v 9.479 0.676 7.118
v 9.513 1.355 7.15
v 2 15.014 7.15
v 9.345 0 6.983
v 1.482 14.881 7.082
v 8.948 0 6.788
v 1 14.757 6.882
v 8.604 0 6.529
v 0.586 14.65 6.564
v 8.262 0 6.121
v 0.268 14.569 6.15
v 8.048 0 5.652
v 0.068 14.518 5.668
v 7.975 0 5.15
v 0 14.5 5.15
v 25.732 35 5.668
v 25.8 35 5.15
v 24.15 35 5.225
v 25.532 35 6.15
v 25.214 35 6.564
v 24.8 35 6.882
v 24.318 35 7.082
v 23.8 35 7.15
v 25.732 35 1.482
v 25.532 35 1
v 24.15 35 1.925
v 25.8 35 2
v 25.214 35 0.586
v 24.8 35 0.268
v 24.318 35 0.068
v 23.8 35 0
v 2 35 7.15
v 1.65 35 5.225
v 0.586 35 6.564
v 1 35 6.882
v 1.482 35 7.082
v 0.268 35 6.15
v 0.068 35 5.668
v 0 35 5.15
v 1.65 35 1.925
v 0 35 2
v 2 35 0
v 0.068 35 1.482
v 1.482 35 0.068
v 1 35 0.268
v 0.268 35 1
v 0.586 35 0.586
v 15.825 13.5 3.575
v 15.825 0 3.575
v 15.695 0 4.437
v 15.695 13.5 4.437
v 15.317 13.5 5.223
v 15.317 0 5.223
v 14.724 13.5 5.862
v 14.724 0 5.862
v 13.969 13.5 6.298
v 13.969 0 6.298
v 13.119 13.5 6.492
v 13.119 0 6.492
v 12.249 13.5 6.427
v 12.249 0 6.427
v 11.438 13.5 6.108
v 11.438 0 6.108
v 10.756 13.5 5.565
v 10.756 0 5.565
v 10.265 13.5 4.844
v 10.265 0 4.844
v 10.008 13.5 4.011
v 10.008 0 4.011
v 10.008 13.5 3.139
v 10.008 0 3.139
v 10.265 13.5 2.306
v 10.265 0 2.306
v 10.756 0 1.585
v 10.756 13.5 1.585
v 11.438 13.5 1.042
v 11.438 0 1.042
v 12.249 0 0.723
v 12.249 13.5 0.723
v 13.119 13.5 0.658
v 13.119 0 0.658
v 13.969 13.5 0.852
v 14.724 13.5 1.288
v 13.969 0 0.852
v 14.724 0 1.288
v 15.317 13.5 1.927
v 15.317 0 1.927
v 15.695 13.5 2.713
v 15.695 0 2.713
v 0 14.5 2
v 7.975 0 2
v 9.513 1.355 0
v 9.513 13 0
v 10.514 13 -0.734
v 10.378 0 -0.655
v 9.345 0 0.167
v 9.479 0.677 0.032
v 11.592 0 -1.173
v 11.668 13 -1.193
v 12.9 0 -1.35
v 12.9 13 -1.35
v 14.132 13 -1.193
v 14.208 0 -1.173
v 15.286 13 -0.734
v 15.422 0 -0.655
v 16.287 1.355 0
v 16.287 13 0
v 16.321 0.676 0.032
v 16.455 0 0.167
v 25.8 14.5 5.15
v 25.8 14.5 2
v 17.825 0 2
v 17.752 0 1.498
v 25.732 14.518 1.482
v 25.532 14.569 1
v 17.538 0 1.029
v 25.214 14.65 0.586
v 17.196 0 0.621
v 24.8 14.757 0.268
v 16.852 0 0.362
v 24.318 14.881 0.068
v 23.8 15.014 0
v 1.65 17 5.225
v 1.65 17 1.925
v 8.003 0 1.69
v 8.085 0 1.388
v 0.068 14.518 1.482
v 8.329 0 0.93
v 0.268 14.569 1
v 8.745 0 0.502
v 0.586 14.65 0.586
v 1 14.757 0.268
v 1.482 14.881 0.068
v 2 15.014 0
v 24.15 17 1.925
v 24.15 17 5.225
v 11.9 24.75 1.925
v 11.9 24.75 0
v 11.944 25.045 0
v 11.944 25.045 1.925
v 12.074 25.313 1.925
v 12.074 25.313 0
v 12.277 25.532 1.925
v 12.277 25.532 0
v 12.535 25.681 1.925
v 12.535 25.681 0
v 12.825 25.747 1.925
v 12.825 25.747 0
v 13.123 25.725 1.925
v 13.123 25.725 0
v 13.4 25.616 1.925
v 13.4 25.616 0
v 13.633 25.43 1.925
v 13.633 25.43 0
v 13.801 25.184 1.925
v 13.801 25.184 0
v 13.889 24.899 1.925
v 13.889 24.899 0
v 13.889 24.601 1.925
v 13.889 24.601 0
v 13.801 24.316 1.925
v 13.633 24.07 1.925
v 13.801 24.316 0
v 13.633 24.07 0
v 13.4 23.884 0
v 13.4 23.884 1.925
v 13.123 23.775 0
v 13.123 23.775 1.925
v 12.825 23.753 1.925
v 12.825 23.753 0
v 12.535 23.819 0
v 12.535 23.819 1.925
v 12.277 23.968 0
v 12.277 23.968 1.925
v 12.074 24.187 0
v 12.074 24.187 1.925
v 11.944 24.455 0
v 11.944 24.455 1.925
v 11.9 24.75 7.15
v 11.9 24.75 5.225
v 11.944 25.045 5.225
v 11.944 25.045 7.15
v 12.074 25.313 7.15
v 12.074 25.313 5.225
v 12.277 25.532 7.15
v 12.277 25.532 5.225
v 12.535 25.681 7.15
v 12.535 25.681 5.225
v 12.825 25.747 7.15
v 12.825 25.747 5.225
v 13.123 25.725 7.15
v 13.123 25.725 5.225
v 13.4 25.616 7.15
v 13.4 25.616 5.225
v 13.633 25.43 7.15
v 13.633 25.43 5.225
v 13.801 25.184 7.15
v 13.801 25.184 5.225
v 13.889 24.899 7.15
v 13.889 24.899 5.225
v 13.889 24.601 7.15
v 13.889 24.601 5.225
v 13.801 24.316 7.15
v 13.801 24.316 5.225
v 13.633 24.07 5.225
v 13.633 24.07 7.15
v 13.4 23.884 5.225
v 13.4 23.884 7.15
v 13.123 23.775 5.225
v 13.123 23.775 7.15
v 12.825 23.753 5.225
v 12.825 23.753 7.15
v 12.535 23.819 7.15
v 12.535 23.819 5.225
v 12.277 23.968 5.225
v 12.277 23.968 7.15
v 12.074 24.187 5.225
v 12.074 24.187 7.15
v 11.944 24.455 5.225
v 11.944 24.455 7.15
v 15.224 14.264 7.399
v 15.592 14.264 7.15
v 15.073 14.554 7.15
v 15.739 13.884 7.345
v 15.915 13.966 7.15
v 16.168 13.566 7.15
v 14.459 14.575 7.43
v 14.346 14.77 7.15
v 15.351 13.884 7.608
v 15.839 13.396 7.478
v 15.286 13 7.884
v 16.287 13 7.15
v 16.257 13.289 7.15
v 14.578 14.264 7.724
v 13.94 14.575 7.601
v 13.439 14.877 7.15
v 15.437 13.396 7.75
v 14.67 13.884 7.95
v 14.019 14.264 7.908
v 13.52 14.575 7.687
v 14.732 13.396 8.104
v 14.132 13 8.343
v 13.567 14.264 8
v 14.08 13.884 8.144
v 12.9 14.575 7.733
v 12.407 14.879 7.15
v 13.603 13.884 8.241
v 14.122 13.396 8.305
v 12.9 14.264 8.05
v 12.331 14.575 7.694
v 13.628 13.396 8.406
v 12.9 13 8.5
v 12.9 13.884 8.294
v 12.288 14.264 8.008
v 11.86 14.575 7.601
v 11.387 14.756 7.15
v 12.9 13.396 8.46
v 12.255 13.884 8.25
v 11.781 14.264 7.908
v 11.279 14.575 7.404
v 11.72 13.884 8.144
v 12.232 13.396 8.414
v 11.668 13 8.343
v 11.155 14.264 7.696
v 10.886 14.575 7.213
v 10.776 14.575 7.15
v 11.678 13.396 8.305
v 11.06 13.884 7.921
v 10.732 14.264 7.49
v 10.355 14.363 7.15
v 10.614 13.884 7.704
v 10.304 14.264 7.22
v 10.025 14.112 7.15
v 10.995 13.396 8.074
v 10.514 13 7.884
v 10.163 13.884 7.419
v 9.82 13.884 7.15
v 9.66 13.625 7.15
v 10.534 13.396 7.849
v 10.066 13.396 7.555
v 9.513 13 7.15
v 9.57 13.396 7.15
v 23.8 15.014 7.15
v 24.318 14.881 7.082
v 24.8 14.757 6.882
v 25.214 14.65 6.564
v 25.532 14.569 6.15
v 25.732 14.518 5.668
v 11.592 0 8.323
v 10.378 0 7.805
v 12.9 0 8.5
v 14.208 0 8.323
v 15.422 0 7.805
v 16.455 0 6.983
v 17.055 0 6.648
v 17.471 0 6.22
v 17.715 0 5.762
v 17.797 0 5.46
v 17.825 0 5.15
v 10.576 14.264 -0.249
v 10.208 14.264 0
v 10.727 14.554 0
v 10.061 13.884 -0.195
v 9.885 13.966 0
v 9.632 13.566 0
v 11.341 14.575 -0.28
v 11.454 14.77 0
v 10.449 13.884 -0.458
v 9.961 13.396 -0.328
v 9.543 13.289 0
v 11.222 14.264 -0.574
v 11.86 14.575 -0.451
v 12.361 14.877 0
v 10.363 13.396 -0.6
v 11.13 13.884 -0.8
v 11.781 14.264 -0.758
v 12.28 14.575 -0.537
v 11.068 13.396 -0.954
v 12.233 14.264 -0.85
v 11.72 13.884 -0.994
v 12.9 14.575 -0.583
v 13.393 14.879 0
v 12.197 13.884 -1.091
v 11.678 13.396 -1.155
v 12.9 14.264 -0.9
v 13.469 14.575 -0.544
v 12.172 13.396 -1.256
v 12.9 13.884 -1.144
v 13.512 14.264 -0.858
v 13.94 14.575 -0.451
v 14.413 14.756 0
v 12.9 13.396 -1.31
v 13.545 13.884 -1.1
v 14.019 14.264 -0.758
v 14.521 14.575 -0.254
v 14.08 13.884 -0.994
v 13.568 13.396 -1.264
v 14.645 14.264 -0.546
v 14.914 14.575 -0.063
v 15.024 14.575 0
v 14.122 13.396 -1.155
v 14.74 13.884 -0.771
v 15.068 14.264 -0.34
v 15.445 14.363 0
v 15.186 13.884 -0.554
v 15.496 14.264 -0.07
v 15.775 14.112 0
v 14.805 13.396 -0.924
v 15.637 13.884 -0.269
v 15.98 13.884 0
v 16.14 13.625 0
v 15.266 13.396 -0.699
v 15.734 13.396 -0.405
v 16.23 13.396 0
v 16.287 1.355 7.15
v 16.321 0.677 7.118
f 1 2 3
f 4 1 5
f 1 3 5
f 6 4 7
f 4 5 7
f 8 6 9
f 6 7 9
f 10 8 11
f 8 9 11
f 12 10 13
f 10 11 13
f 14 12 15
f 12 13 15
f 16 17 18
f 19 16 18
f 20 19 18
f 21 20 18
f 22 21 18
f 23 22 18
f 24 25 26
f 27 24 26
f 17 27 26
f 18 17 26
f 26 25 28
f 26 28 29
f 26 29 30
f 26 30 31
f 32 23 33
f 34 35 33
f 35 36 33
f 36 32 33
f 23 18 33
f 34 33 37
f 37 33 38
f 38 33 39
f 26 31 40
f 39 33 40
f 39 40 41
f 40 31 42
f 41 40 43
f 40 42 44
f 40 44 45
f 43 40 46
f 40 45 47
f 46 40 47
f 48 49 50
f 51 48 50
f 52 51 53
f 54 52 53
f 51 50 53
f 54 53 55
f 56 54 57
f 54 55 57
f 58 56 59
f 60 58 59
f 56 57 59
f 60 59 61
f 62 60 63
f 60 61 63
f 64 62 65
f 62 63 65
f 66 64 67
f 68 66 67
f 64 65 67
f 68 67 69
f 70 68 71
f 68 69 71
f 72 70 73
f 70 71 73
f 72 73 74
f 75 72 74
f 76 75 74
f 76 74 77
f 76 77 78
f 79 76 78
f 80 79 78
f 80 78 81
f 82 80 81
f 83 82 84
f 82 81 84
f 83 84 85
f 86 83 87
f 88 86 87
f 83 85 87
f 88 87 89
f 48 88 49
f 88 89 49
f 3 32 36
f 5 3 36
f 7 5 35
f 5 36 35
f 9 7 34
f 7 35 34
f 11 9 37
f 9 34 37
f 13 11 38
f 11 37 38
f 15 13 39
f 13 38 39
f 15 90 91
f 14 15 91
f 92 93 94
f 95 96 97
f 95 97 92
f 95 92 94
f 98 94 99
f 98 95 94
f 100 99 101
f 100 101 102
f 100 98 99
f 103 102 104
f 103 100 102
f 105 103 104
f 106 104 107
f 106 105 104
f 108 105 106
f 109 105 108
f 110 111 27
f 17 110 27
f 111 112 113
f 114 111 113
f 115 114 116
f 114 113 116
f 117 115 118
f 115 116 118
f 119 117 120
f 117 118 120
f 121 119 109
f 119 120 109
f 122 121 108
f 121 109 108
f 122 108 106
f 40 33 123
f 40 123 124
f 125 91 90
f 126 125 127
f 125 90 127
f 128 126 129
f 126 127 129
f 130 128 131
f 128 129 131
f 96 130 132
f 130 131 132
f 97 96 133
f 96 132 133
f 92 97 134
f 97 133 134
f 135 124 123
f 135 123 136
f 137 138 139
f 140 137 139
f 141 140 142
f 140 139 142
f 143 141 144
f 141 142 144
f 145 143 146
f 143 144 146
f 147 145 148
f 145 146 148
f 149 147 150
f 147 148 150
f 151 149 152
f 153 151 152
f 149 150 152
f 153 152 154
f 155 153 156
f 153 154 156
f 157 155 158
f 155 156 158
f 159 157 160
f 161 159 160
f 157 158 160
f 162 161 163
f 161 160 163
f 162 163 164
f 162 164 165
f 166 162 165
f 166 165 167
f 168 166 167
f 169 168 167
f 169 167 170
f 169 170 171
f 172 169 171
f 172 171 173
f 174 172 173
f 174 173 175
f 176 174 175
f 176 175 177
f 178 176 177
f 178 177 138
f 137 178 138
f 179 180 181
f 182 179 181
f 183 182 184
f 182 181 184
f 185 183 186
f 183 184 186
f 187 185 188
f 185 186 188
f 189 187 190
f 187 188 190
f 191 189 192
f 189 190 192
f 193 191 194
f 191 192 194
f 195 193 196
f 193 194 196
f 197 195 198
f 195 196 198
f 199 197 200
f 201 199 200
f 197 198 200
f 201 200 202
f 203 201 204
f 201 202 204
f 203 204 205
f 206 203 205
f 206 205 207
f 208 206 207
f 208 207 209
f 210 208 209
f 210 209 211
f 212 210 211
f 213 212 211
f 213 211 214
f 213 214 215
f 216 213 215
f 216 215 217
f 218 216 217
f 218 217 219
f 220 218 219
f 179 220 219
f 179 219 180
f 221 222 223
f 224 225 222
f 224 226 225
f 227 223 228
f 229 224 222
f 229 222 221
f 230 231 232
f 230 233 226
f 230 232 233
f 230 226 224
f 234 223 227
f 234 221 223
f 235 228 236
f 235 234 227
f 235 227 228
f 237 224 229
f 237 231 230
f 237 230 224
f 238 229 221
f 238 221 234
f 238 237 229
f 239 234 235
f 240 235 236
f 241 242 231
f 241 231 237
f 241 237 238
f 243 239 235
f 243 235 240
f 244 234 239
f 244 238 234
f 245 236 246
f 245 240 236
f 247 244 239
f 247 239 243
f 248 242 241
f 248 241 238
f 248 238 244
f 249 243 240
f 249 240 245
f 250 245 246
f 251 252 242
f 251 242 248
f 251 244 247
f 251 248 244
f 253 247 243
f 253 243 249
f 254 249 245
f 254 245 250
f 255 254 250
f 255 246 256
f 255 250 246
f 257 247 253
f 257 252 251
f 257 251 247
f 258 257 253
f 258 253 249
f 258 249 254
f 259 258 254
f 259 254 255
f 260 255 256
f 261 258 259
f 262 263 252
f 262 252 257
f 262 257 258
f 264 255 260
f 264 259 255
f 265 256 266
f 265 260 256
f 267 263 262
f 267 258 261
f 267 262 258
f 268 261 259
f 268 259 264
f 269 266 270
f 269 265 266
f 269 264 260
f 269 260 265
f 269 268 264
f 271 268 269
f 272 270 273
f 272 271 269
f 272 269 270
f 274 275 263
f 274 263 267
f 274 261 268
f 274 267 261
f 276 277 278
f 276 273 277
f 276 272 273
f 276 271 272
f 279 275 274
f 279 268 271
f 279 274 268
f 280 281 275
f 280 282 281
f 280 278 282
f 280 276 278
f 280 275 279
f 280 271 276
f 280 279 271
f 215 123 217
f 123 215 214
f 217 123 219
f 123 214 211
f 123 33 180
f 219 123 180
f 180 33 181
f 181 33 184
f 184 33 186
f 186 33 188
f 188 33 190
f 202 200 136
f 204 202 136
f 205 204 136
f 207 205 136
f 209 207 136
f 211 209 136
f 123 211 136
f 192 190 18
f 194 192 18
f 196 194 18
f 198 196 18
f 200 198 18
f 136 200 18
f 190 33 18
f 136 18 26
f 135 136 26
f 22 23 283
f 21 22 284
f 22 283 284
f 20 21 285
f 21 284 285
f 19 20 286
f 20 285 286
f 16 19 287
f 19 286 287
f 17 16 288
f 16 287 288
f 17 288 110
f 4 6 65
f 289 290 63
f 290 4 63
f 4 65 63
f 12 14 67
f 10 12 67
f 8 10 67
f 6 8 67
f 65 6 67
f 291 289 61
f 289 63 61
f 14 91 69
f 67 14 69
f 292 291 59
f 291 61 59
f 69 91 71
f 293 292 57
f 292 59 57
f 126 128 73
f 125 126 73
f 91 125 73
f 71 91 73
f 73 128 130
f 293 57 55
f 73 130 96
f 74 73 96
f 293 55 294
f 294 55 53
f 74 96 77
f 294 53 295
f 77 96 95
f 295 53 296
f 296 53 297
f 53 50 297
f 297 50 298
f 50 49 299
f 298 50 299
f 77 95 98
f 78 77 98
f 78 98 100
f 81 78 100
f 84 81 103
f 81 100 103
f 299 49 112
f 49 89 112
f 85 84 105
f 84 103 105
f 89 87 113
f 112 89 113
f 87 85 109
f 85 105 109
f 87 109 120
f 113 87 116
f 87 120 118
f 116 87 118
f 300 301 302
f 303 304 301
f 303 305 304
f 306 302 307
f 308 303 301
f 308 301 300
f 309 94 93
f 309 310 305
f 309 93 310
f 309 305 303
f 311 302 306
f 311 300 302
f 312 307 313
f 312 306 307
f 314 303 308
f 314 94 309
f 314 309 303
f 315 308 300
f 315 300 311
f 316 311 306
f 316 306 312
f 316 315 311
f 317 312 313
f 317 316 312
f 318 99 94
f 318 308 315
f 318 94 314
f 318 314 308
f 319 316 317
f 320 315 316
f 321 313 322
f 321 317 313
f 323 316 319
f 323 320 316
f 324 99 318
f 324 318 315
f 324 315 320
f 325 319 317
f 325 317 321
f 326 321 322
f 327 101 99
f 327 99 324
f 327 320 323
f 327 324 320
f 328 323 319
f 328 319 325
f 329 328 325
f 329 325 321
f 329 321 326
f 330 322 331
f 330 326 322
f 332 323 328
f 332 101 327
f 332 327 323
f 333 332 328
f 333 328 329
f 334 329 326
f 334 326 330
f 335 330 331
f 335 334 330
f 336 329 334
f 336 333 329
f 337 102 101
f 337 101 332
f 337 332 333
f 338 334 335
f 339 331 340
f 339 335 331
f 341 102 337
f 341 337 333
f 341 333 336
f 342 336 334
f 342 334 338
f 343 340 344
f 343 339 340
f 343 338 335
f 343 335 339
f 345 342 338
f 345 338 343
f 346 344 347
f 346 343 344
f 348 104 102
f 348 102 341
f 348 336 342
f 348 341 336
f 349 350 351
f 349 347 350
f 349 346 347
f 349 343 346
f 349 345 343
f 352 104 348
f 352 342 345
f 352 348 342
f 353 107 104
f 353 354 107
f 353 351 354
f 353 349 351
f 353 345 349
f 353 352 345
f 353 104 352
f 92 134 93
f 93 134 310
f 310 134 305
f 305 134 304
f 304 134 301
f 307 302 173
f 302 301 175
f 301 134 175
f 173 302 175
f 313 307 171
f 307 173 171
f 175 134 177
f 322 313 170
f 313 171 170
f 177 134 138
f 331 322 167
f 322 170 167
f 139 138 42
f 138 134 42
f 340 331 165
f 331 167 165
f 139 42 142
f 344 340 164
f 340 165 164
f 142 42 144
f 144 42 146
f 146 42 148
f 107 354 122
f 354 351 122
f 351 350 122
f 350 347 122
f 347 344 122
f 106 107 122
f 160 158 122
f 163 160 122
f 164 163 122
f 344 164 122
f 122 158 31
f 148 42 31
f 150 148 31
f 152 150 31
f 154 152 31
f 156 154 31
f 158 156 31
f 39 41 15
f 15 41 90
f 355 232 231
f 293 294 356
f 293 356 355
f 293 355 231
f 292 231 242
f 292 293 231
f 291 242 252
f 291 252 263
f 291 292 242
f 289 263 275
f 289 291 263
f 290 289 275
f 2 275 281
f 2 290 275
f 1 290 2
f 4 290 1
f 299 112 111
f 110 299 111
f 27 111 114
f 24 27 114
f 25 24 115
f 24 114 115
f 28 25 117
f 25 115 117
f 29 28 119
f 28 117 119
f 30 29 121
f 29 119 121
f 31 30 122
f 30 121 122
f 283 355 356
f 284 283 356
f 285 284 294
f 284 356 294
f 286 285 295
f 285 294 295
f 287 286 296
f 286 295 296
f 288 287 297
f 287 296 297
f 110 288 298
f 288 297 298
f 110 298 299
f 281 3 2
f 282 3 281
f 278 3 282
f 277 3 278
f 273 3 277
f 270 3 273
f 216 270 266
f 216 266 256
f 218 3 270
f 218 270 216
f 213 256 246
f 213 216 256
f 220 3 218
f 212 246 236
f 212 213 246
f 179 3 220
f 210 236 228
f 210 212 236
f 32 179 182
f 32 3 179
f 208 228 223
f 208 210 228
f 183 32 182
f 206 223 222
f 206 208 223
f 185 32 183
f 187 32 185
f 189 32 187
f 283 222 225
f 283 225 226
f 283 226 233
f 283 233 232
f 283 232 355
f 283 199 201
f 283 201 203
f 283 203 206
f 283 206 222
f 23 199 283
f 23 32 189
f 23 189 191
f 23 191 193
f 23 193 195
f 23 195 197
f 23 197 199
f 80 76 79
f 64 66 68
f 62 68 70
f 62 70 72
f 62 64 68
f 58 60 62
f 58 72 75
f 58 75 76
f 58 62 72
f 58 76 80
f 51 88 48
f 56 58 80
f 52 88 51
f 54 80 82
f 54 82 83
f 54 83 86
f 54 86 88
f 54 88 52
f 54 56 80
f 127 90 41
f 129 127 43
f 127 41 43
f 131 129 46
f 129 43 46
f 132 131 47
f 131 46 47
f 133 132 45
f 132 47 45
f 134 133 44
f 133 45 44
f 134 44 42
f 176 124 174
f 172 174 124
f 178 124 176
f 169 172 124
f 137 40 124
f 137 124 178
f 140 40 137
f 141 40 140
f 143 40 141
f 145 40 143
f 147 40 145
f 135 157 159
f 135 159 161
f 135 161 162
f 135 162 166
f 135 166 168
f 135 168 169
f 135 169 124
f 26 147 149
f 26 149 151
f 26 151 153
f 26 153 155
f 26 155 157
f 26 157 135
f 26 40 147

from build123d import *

# Parameters (mm, degrees)
BOSS_EXTRUDE1_DEPTH = 7.15
SKETCH3_R           = 4.925
BOSS_EXTRUDE2_DEPTH = 15
SKETCH4_R           = 2.925
CUT_EXTRUDE1_DEPTH  = 13.5
SKETCH5_W           = 22.5
SKETCH5_H           = 3.3
CUT_EXTRUDE2_DEPTH  = 18
SKETCH6_R           = 1
CUT_EXTRUDE3_DEPTH  = 45.304514443
FILLET1_R           = 2


with BuildPart() as part:
    # Sketch2 → Boss-Extrude1 (new body)
    with BuildSketch(Plane.XY):
        Polygon((7.975, 0), (17.825, 0), (25.8, 14.5), (25.8, 35), (0, 35), (0, 14.5), align=None)
    extrude(amount=BOSS_EXTRUDE1_DEPTH)

    # Sketch3 → Boss-Extrude2 (add)
    with BuildSketch(Plane.XZ):
        with Locations((12.9, 3.575)):
            Circle(SKETCH3_R)
    extrude(amount=-BOSS_EXTRUDE2_DEPTH)

    # Sketch4 → Cut-Extrude1 (cut)
    with BuildSketch(Plane.XZ):
        with Locations((12.9, 3.575)):
            Circle(SKETCH4_R)
    extrude(amount=-CUT_EXTRUDE1_DEPTH, mode=Mode.SUBTRACT)

    # Sketch5 → Cut-Extrude2 (cut)
    with BuildSketch(Plane(origin=(0, 35, 0), x_dir=(1, 0, 0), z_dir=(0, 1, 0))):
        with Locations((12.9, -3.575)):
            Rectangle(SKETCH5_W, SKETCH5_H)
    extrude(amount=-CUT_EXTRUDE2_DEPTH, mode=Mode.SUBTRACT)

    # Sketch6 → Cut-Extrude3 (cut, through all)
    with BuildSketch(Plane(origin=(0, 0, 0), x_dir=(-1, 0, 0), z_dir=(0, 0, -1))):
        with Locations((-12.9, 24.75)):
            Circle(SKETCH6_R)
    extrude(amount=-CUT_EXTRUDE3_DEPTH, mode=Mode.SUBTRACT)

    # Fillet1
    # the kernel refuses this fillet: 2 mm, written as the material it takes off along each edge
    with BuildSketch(Plane(origin=(12.9, 15, 3.575), x_dir=(0.9794089200895291, 0, -0.20188652072157354), z_dir=(-0.20188652072157354, 0, -0.9794089200895291))) as fillet1_piece_1_section:
        with BuildLine():
            CenterArc((4.925 - FILLET1_R, FILLET1_R), FILLET1_R, 270, 90)
            Line((4.925 - FILLET1_R, 0), (4.925, 0))
            Line((4.925, 0), (4.925, FILLET1_R))
        make_face()
    fillet1_piece_1 = revolve(axis=Axis((12.9, 15, 3.575), (0, -1, 0)), revolution_arc=203.294598703, mode=Mode.PRIVATE)
    fillet1_piece_1 = split(fillet1_piece_1, bisect_by=Plane(origin=(12.9, 14.171762317, 7.15), z_dir=(0, 0, 1)), keep=Keep.TOP, mode=Mode.PRIVATE)
    add(fillet1_piece_1, mode=Mode.SUBTRACT)
    with BuildSketch(Plane(origin=(12.9, 15, 3.575), x_dir=(-0.9794089200895291, 0, 0.20188652072157326), z_dir=(0.20188652072157326, 0, 0.9794089200895291))) as fillet1_piece_2_section:
        with BuildLine():
            CenterArc((4.925 - FILLET1_R, FILLET1_R), FILLET1_R, 270, 90)
            Line((4.925 - FILLET1_R, 0), (4.925, 0))
            Line((4.925, 0), (4.925, FILLET1_R))
        make_face()
    fillet1_piece_2 = revolve(axis=Axis((12.9, 15, 3.575), (0, -1, 0)), revolution_arc=203.294598703, mode=Mode.PRIVATE)
    fillet1_piece_2 = split(fillet1_piece_2, bisect_by=Plane(origin=(12.9, 14.171762317, 0), z_dir=(0, 0, -1)), keep=Keep.TOP, mode=Mode.PRIVATE)
    add(fillet1_piece_2, mode=Mode.SUBTRACT)
    with BuildSketch(Plane(origin=(-2.409593749, 18.881079543, 7.15), x_dir=(0, 0, -1), z_dir=(0.48191874977215604, -0.876215908676647, 0))) as fillet1_piece_3_section:
        with BuildLine():
            CenterArc((FILLET1_R, FILLET1_R), FILLET1_R, 180, 90)
            Line((0, FILLET1_R), (0, 0))
            Line((0, 0), (FILLET1_R, 0))
        make_face()
    fillet1_piece_3 = extrude(amount=26.548432705, mode=Mode.PRIVATE)
    fillet1_piece_3 = fillet1_piece_3 - Plane(origin=(12.9, 7.738737356, 3.575), x_dir=(1, 0, 0), z_dir=(0, -1, 0)) * Cylinder(4.925, 62, mode=Mode.PRIVATE)
    add(fillet1_piece_3, mode=Mode.SUBTRACT)
    with BuildSketch(Plane(origin=(-2.409593749, 18.881079543, 0), x_dir=(0.876215908676647, 0.48191874977215604, 0), z_dir=(0.48191874977215604, -0.876215908676647, 0))) as fillet1_piece_4_section:
        with BuildLine():
            CenterArc((FILLET1_R, FILLET1_R), FILLET1_R, 180, 90)
            Line((0, FILLET1_R), (0, 0))
            Line((0, 0), (FILLET1_R, 0))
        make_face()
    fillet1_piece_4 = extrude(amount=26.548432705, mode=Mode.PRIVATE)
    fillet1_piece_4 = fillet1_piece_4 - Plane(origin=(12.9, 7.738737334, 3.575), x_dir=(1, 0, 0), z_dir=(0, -1, 0)) * Cylinder(4.925, 62, mode=Mode.PRIVATE)
    add(fillet1_piece_4, mode=Mode.SUBTRACT)
    with BuildSketch(Plane(origin=(15.415406251, -4.381079543, 7.15), x_dir=(-0.8762159086766471, 0.4819187497721556, 0), z_dir=(0.48191874977215565, 0.8762159086766471, 0))) as fillet1_piece_5_section:
        with BuildLine():
            CenterArc((FILLET1_R, -FILLET1_R), FILLET1_R, 90, 90)
            Line((0, -FILLET1_R), (0, 0))
            Line((0, 0), (FILLET1_R, 0))
        make_face()
    fillet1_piece_5 = extrude(amount=26.548432705, mode=Mode.PRIVATE)
    fillet1_piece_5 = fillet1_piece_5 - Plane(origin=(12.9, 7.738737334, 3.575), x_dir=(1, 0, 0), z_dir=(0, -1, 0)) * Cylinder(4.925, 62, mode=Mode.PRIVATE)
    add(fillet1_piece_5, mode=Mode.SUBTRACT)
    with BuildSketch(Plane(origin=(15.415406251, -4.381079543, 0), x_dir=(-0.8762159086766471, 0.4819187497721556, 0), z_dir=(0.48191874977215565, 0.8762159086766471, 0))) as fillet1_piece_6_section:
        with BuildLine():
            CenterArc((FILLET1_R, FILLET1_R), FILLET1_R, 180, 90)
            Line((0, FILLET1_R), (0, 0))
            Line((0, 0), (FILLET1_R, 0))
        make_face()
    fillet1_piece_6 = extrude(amount=26.548432705, mode=Mode.PRIVATE)
    fillet1_piece_6 = fillet1_piece_6 - Plane(origin=(12.9, 7.738737305, 3.575), x_dir=(1, 0, 0), z_dir=(0, -1, 0)) * Cylinder(4.925, 62, mode=Mode.PRIVATE)
    add(fillet1_piece_6, mode=Mode.SUBTRACT)
    with BuildSketch(Plane(origin=(25.8, 9.5, 7.15), x_dir=(-1, 0, 0), z_dir=(0, 1, 0)), Plane(origin=(0, 40, 7.15), x_dir=(1, 0, 0), z_dir=(0, -1, 0))) as fillet1_piece_7:
        with BuildLine():
            CenterArc((FILLET1_R, -FILLET1_R), FILLET1_R, 90, 90)
            Line((0, -FILLET1_R), (0, 0))
            Line((0, 0), (FILLET1_R, 0))
        make_face()
    extrude(amount=30.5, mode=Mode.SUBTRACT)
    with BuildSketch(Plane(origin=(0, 40, 0), x_dir=(1, 0, 0), z_dir=(0, -1, 0)), Plane(origin=(25.8, 9.5, 0), x_dir=(-1, 0, 0), z_dir=(0, 1, 0))) as fillet1_piece_8:
        with BuildLine():
            CenterArc((FILLET1_R, FILLET1_R), FILLET1_R, 180, 90)
            Line((0, FILLET1_R), (0, 0))
            Line((0, 0), (FILLET1_R, 0))
        make_face()
    extrude(amount=30.5, mode=Mode.SUBTRACT)


solid = part.part
